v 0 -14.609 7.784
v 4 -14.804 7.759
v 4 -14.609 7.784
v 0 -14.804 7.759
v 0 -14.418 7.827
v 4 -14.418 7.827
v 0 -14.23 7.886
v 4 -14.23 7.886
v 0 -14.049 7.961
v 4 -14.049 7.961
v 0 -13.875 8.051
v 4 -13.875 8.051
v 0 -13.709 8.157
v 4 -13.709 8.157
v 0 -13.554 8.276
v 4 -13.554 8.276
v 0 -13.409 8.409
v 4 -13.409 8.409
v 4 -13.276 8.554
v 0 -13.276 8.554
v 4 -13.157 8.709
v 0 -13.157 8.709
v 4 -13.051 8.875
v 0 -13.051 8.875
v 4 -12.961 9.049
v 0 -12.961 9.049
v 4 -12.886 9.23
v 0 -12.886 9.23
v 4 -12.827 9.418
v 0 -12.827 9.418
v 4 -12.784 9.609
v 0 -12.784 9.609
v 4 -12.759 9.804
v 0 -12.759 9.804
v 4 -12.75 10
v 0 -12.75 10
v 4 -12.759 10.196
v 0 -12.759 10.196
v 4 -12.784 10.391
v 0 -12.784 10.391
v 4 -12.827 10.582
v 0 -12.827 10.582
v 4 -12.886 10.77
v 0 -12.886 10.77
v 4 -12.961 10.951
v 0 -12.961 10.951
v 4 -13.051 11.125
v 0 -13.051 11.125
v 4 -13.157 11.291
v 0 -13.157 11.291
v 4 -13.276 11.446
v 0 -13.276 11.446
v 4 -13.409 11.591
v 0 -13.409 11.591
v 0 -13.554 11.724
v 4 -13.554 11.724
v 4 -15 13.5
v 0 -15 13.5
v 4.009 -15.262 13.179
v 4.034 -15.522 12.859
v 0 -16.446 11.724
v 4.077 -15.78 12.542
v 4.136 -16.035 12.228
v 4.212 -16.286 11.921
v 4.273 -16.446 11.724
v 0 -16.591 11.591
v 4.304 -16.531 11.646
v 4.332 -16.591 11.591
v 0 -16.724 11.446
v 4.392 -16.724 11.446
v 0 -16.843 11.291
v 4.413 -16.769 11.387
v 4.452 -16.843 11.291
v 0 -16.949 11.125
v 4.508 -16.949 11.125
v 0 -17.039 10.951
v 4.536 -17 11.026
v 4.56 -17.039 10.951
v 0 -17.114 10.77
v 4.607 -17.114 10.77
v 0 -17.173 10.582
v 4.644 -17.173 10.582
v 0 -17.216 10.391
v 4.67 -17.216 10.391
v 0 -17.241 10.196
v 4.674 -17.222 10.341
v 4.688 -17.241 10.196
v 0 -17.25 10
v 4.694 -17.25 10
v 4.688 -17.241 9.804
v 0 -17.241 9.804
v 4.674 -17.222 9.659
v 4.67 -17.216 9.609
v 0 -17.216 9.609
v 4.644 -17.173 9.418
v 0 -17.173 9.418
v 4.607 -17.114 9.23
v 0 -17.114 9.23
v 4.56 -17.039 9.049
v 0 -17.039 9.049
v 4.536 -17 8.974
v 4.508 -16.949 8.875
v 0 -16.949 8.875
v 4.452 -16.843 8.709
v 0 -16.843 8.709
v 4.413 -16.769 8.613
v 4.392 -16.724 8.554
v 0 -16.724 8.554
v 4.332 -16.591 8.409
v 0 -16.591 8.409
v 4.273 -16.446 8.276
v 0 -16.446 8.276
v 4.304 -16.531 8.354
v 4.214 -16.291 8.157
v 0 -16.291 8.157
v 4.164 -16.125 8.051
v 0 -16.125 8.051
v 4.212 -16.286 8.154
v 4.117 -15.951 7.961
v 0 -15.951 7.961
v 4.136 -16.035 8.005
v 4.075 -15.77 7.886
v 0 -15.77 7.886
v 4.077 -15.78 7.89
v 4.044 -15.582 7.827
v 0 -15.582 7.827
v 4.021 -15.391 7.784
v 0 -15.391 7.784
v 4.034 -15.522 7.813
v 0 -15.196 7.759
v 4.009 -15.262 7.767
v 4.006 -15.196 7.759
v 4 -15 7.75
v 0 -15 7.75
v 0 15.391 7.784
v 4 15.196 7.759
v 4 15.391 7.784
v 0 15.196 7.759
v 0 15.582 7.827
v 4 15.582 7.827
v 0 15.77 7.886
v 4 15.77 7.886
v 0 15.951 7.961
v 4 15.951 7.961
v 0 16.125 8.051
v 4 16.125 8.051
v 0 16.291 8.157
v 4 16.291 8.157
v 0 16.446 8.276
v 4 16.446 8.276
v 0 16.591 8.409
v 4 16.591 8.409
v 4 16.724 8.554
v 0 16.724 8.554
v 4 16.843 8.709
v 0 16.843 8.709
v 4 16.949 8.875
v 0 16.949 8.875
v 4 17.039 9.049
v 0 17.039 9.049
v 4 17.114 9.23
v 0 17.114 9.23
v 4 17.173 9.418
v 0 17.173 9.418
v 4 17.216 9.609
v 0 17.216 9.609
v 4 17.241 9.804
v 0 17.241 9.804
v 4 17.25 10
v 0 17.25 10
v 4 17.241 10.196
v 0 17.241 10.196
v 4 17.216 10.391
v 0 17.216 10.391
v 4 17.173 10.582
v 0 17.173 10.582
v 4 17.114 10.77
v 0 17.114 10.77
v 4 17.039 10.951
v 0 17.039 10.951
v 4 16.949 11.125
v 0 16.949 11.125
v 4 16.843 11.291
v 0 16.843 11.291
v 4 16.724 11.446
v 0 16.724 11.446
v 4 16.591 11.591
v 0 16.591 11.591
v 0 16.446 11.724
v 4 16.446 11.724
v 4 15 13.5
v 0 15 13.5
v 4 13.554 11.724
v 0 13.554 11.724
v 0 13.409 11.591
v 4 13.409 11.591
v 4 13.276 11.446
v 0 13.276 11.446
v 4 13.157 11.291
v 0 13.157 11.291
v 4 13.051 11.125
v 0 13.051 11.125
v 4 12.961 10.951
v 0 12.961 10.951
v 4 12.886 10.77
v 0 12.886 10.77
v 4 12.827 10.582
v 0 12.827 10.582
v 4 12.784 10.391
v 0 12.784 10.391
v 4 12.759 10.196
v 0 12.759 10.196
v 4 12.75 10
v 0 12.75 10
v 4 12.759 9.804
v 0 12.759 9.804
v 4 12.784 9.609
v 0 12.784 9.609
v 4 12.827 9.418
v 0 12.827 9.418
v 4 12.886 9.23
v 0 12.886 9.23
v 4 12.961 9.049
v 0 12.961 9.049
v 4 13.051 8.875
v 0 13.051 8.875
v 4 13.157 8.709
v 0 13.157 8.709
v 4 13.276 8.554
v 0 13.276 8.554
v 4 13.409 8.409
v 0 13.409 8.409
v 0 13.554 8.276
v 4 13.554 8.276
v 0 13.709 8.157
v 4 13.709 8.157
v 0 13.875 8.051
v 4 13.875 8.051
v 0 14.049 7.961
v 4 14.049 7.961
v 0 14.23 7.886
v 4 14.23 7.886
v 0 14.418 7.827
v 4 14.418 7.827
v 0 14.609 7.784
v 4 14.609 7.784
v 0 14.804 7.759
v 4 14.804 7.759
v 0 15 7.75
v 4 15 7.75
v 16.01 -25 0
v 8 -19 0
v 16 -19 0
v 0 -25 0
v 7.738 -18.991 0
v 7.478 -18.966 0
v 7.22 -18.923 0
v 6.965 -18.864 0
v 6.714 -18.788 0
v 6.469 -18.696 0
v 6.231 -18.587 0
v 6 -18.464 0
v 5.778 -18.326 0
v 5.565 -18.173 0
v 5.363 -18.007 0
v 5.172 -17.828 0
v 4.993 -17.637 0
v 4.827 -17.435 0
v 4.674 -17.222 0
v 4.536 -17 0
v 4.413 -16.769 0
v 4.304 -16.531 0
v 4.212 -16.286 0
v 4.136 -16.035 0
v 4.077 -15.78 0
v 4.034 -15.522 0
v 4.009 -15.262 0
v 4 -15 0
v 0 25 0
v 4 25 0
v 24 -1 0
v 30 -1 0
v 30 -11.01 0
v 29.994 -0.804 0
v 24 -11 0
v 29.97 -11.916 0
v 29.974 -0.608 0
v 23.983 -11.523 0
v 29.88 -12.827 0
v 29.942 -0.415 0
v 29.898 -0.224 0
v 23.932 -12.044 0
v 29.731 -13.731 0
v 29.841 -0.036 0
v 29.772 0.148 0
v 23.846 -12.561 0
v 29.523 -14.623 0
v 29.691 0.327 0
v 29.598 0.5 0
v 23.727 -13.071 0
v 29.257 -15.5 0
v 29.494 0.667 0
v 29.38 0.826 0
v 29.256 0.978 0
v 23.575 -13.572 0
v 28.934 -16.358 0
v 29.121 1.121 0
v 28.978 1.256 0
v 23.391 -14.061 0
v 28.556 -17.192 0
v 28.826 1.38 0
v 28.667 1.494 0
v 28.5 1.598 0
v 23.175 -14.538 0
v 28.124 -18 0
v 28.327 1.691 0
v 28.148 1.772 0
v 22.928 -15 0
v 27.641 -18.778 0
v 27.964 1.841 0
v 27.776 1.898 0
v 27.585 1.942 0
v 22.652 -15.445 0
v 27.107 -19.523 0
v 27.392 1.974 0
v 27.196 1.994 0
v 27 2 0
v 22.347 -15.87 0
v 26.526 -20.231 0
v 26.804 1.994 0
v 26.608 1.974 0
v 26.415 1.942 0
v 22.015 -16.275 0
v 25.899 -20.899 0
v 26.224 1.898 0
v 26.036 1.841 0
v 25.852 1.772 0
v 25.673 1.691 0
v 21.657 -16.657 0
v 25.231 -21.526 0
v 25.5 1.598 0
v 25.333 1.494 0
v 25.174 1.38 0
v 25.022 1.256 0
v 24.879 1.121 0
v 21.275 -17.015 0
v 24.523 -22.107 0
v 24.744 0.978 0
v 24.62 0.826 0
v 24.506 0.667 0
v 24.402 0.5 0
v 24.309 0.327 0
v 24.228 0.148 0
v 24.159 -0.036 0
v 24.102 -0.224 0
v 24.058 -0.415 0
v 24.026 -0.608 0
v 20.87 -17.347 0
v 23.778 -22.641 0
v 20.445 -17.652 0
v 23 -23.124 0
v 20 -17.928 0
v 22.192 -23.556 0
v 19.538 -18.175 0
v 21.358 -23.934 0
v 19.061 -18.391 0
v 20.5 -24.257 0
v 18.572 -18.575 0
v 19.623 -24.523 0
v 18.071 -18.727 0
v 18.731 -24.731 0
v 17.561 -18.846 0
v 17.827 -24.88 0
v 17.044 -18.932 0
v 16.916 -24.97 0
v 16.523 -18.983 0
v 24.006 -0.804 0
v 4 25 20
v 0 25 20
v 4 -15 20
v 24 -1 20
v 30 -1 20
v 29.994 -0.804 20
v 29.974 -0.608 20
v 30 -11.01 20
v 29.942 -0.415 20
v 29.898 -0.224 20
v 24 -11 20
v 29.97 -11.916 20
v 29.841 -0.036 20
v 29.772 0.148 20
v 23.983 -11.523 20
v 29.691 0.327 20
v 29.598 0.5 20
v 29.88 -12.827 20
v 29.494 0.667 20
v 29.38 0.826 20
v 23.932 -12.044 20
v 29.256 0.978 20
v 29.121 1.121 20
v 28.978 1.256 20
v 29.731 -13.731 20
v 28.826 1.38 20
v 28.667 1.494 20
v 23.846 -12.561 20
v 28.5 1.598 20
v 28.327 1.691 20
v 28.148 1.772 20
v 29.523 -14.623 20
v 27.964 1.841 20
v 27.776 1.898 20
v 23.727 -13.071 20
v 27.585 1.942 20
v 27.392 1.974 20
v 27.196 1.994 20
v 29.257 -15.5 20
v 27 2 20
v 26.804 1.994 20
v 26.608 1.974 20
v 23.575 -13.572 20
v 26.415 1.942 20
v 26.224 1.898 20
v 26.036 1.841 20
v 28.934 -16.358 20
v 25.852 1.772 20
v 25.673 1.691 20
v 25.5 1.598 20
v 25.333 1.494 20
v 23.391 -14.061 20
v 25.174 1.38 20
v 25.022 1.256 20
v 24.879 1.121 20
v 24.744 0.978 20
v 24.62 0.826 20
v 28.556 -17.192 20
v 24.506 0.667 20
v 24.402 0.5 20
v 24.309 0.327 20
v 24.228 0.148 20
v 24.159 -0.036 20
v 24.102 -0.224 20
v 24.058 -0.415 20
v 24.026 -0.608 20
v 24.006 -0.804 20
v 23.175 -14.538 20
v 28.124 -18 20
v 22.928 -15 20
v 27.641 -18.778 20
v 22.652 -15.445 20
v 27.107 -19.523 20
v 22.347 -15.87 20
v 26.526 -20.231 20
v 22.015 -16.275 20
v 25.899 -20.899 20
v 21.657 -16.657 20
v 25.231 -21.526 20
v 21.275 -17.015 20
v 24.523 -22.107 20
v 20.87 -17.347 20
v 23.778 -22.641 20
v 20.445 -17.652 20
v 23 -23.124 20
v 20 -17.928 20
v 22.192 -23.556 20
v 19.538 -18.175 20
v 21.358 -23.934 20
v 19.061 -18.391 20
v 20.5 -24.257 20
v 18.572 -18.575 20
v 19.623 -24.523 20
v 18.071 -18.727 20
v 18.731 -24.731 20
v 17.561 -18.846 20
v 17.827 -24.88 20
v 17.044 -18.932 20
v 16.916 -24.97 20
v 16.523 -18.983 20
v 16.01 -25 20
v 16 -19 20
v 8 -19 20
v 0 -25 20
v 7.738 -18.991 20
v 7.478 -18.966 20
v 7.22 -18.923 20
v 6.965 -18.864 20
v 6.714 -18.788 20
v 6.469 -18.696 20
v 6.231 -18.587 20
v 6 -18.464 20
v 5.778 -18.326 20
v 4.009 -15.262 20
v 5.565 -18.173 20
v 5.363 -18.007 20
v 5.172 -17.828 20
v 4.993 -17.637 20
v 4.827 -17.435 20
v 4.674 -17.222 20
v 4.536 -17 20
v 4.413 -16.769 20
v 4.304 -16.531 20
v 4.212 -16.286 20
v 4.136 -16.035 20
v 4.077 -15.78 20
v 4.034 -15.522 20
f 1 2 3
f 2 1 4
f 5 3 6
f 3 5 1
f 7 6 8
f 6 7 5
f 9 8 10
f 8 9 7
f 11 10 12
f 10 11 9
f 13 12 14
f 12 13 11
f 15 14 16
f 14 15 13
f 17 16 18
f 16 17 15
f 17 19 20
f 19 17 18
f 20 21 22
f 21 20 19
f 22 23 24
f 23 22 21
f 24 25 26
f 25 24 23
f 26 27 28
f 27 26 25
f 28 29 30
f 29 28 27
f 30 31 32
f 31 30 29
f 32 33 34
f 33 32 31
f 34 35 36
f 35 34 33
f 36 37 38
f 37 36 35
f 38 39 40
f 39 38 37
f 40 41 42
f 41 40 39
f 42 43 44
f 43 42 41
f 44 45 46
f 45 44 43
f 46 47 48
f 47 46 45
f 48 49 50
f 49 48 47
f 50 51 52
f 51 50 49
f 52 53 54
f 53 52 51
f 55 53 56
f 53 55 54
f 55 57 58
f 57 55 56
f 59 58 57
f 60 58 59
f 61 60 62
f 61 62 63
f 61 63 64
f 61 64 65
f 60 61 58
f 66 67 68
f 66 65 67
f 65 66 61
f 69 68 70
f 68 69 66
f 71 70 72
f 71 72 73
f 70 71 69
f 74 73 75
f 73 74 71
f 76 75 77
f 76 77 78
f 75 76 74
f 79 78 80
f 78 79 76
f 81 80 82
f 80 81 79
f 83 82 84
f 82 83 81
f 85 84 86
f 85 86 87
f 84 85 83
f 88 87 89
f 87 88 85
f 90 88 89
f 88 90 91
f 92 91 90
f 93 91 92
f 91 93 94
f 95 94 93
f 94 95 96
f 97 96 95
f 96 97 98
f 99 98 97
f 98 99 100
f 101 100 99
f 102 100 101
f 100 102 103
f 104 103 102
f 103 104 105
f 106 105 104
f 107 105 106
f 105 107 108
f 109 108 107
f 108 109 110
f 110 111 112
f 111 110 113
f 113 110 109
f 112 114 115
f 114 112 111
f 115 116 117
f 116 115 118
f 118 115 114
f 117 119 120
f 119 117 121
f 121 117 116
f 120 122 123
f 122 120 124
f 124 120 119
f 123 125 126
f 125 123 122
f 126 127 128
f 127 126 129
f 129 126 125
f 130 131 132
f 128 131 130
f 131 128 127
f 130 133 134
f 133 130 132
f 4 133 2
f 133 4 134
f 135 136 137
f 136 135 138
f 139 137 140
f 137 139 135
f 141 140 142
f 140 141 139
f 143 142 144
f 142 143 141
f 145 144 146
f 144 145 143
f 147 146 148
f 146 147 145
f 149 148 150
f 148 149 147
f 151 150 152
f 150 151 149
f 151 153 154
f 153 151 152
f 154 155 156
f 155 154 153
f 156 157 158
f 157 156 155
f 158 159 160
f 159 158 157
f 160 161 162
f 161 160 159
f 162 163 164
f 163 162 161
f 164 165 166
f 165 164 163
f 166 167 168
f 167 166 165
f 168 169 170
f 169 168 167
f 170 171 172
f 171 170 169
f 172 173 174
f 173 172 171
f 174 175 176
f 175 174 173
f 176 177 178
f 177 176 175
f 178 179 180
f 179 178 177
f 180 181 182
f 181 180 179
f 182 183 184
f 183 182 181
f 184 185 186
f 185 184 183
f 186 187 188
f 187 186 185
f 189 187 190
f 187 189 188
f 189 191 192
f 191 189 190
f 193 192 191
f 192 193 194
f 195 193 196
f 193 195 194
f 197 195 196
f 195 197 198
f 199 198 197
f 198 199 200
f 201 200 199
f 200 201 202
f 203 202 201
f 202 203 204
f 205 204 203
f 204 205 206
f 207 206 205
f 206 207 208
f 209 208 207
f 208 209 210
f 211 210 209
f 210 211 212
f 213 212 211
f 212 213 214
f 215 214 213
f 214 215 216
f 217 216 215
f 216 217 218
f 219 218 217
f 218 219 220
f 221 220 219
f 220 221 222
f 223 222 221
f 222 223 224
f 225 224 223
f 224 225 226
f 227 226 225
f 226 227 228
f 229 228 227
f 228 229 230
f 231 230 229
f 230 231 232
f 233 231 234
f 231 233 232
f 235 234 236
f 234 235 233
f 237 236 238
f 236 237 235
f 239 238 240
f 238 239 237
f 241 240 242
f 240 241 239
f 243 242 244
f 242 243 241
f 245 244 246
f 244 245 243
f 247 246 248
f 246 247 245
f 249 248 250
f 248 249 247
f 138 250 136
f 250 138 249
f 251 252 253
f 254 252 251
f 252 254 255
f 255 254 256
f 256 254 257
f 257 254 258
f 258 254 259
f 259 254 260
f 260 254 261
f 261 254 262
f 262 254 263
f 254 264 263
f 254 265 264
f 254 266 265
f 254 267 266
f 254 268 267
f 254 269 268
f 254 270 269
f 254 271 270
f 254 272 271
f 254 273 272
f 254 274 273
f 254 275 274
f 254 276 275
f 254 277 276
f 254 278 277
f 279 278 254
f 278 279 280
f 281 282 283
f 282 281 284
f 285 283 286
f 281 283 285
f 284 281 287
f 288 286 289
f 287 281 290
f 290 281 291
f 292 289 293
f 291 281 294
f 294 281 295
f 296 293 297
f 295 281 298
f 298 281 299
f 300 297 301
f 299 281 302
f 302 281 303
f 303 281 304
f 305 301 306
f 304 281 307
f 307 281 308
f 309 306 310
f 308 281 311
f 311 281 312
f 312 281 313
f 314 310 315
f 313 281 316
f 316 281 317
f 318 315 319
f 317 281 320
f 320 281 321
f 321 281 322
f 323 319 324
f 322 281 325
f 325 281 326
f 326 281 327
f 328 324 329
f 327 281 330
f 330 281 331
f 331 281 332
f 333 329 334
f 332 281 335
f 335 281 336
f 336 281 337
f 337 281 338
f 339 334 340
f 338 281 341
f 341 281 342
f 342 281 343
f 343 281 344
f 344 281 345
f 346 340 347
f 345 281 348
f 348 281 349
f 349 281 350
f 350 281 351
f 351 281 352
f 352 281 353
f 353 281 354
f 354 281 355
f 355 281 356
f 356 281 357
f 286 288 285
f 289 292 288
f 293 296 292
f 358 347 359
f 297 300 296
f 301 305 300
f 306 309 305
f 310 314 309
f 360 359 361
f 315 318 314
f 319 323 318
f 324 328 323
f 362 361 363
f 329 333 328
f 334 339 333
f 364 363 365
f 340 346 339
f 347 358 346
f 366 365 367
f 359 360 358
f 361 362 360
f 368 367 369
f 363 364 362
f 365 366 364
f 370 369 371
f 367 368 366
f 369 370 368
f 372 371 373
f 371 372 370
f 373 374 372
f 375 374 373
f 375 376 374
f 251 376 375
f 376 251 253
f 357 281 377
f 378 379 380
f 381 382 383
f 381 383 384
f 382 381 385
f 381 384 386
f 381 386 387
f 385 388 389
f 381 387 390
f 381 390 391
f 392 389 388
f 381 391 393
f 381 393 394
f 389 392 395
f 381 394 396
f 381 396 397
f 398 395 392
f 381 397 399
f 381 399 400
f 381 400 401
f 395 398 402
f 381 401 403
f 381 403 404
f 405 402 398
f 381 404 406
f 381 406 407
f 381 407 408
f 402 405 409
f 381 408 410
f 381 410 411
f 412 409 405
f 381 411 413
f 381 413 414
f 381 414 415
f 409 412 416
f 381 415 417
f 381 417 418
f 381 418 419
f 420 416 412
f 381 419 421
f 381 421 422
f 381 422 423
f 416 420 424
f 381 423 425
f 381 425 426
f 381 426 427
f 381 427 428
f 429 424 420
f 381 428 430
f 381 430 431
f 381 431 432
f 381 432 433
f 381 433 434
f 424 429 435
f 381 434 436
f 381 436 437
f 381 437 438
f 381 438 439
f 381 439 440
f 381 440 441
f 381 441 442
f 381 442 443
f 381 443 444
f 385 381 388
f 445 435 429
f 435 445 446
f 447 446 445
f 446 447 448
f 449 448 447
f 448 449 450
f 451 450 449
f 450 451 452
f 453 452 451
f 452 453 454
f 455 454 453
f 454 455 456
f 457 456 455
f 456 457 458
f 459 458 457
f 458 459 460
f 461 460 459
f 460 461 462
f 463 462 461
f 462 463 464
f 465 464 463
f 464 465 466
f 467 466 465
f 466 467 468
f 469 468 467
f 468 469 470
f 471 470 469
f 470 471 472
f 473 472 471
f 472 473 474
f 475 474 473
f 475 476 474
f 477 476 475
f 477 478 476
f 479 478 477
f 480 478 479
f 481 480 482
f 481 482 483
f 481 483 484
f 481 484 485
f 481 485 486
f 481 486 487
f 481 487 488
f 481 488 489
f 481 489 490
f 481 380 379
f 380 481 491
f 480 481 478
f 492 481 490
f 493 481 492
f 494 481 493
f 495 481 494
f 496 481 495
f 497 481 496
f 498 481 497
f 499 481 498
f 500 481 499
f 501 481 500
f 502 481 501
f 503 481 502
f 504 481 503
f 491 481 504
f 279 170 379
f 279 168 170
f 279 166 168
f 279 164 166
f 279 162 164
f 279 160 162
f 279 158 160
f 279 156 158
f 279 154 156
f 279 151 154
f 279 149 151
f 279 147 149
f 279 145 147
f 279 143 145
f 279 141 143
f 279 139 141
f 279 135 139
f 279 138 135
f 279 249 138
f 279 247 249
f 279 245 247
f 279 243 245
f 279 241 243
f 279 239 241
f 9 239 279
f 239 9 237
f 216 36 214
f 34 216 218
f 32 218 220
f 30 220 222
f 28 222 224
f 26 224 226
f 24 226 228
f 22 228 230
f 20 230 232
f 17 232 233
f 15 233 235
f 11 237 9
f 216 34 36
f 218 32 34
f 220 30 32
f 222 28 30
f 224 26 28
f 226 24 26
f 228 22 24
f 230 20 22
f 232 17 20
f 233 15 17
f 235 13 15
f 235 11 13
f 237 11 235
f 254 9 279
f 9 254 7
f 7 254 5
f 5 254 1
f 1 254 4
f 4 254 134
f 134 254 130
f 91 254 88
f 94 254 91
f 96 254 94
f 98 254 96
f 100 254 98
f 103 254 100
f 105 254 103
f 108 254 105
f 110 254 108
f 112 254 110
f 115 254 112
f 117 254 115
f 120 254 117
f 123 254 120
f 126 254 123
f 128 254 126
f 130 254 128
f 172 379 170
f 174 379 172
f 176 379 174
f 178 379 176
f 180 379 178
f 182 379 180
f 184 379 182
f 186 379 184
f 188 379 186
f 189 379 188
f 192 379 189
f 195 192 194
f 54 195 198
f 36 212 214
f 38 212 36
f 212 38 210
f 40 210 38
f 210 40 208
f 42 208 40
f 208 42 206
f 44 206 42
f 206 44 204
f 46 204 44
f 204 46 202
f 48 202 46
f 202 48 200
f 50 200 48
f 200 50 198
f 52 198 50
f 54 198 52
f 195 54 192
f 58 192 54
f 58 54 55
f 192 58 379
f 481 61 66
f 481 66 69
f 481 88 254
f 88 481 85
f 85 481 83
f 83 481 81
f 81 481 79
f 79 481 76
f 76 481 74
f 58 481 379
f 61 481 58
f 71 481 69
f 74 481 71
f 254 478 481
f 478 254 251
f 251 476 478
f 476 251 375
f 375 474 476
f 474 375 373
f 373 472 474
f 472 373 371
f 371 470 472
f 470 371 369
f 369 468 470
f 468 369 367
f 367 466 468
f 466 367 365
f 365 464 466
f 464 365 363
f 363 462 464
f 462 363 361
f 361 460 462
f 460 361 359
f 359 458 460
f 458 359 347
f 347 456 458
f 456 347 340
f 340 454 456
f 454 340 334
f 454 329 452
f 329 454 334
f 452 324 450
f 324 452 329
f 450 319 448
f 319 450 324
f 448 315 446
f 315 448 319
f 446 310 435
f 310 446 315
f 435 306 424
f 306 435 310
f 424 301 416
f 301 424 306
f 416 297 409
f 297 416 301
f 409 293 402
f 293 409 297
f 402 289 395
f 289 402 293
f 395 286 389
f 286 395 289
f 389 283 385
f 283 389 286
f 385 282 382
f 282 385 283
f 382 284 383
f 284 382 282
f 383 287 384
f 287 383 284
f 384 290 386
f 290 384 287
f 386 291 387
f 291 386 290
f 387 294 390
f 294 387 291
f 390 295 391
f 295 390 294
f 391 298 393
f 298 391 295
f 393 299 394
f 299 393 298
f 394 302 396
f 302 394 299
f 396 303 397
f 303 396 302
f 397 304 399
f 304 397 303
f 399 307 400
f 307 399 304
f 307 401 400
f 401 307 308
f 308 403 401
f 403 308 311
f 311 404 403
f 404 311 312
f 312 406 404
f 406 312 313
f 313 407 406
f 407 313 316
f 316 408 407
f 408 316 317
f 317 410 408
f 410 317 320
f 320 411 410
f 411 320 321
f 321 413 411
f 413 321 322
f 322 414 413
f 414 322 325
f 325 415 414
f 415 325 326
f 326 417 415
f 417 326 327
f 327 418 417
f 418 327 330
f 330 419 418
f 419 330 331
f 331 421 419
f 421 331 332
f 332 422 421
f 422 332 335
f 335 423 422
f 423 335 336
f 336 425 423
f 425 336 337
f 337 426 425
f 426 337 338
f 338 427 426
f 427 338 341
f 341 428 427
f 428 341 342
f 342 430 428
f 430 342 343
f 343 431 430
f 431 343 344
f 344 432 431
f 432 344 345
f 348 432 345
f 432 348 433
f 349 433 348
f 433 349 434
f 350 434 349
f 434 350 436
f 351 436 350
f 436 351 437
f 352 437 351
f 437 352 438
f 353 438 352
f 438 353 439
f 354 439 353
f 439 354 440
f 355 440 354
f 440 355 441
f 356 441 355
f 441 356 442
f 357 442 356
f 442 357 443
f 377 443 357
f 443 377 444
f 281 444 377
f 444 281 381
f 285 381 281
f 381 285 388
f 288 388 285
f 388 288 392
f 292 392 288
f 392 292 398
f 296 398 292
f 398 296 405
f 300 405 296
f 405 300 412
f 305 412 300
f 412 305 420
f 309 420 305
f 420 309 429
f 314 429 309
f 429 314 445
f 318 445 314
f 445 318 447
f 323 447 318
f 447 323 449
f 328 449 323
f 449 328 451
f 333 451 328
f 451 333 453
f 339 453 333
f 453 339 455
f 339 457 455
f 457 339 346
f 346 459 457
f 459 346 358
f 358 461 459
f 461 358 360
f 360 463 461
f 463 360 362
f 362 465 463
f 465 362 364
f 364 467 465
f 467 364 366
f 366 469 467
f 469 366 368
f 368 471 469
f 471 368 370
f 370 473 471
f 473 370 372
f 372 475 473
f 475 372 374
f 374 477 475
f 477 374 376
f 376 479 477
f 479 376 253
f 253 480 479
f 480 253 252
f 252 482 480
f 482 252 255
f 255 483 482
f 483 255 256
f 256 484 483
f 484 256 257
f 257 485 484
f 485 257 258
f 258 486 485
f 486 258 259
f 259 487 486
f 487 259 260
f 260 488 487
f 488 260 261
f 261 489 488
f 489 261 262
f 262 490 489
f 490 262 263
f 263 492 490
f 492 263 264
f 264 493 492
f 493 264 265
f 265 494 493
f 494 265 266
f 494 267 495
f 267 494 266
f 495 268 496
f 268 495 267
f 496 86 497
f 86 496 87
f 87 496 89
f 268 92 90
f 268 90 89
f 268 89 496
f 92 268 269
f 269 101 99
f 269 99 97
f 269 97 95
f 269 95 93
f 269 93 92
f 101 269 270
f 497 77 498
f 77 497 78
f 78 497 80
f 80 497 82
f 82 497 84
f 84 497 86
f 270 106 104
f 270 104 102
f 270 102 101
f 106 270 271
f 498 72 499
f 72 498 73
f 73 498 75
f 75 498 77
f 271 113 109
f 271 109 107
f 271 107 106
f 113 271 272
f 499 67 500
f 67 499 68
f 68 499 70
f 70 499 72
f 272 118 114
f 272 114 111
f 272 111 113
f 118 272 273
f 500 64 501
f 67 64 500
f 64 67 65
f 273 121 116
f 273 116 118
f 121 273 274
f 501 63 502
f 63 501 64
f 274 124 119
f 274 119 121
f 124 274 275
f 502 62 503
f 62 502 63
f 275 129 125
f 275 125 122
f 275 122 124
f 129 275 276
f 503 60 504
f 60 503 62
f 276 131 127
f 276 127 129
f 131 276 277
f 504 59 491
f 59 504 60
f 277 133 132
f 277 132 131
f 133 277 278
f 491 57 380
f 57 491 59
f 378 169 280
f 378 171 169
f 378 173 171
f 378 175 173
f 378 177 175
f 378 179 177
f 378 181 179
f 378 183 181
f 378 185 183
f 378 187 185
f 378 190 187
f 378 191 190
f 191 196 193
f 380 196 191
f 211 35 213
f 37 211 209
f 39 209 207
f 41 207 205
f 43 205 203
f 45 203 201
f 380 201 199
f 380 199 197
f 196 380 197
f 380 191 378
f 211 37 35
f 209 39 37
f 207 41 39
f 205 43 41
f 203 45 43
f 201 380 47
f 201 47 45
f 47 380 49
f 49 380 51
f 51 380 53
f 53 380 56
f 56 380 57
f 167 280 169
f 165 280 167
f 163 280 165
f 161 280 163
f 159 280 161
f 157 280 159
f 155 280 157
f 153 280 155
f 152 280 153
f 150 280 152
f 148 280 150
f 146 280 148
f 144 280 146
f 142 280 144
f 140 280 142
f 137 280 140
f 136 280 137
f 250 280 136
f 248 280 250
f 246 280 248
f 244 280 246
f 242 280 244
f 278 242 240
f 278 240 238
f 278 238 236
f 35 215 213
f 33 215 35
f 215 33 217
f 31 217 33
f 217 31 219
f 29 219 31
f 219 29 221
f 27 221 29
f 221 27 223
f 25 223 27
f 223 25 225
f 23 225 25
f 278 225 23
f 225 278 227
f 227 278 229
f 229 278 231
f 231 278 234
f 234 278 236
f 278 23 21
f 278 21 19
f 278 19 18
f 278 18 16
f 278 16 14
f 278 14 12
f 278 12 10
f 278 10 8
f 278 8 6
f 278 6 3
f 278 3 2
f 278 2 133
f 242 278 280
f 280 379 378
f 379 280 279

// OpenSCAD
// TEMPLATE: wall / rail J-hook — a mounting plate with two screw holes and a J-shaped hook with a rated load; filleted root, rounded tip
// Interfaces: mount_holes (two horizontal holes through the plate, screw_d + clearance). The plate's back face is the wall: x = 0.
// Origin at the wall face, midway between the screws (y = 0); the hook curls out along +X; the part is extruded along Z (its width).
// Print orientation: ON ITS SIDE — the J profile lies flat on the bed (z = 0 is one side face) so the layers run along the shank and
// curl; the bending load then runs along the layers, not across them. In use, +Y points up: the shank is at the plate's lower end.
// Load path: hung load -> curl -> shank (cantilever, sized by the bending rule below) -> root fillet -> plate -> upper screw in tension.

/* [Interface] */
screw_d = 4.0;           // [2:0.1:8]  screw shank diameter (M4 = 4.0)
clearance = 0.5;         // [0:0.05:1]  added to the hole diameter
hole_spacing = 30;       // [12:1:100]  centre distance between the two screws (along the plate)

/* [Plate] */
plate_t = 4;             // [2.4:0.2:10]
plate_len = 50;          // [20:1:150]
width = 20;              // [8:1:60]  hook width (extrusion along Z)

/* [Hook] */
reach = 30;              // [12:1:80]  from the wall face to the outside of the tip
throat_r = 8;            // [3:0.5:30]  inside radius of the curl (half the rod / strap thickness it accepts)
arm_t = 6;               // [3:0.5:15]  shank and curl thickness
tip_len = 10;            // [0:1:40]  straight tip rising from the curl
root_fillet = 4;         // [0:0.5:12]  fillet where the shank meets the plate

/* [Rating] */
rated_load_kg = 5;       // [0.5:0.5:30]
safety_factor = 3;       // [1.5:0.5:6]
strength_mpa = 30;       // [10:1:80]  tensile strength of the printed material along the layers (PETG ~ 30, PLA ~ 45)

/* [Render] */
render_target = "part";  // [part, coupon, assembly]

/* [Hidden] */
$fn = 96;
hole = screw_d + clearance;
teardrop_angle = 50;                                   // roof angle of the horizontal holes
y0 = -plate_len / 2;                                   // plate lower end (the shank's underside is flush with it)
x_c = reach - throat_r - arm_t;                        // curl centre x
y_c = y0 + arm_t + throat_r;                           // curl centre y
shank_len = x_c - plate_t;
load_n = rated_load_kg * 9.81;
moment_nmm = load_n * (x_c - plate_t);                 // load hangs at the curl centre line
stress_mpa = 6 * moment_nmm / (width * arm_t * arm_t);
allowable_mpa = strength_mpa / safety_factor;
arm_t_needed = sqrt(6 * moment_nmm / (width * allowable_mpa));
upper_screw_pull_n = load_n * x_c / hole_spacing;

assert(shank_len >= root_fillet + 2, "reach too short for the curl, the shank and the root fillet");
assert(stress_mpa <= allowable_mpa, str("shank overstressed: needs arm_t >= ", arm_t_needed, " mm for ", rated_load_kg, " kg"));
assert(hole_spacing / 2 + hole / 2 + 1.6 <= plate_len / 2 - 0, "screw holes too close to the plate ends");
assert(width - hole >= 3.2, "plate too narrow for the holes");
echo(hole = hole, shank_len = shank_len, curl_centre = [x_c, y_c], stress_mpa = stress_mpa, allowable_mpa = allowable_mpa,
     arm_t_needed = arm_t_needed, upper_screw_pull_n = upper_screw_pull_n);

module teardrop2d(d, ang, n = 56) {
    r = d / 2;
    sweep = 360 - 2 * (90 - ang);
    polygon(concat([for (i = [0 : n]) let(a = ang - i * sweep / n) [r * cos(a), r * sin(a)]], [[0, r / sin(90 - ang)]]));
}

// J profile in the XY plane
module profile2d() {
    union() {
        translate([0, y0]) square([plate_t, plate_len]);                                      // plate
        translate([plate_t - 0.01, y0]) square([shank_len + 0.02, arm_t]);                   // shank
        translate([x_c, y_c]) intersection() {                                                // quarter curl
            difference() { circle(r = throat_r + arm_t); circle(r = throat_r); }
            translate([0, -throat_r - arm_t - 1]) square([throat_r + arm_t + 1, throat_r + arm_t + 1]);
        }
        translate([x_c + throat_r, y_c - 0.01]) square([arm_t, tip_len + 0.01]);              // tip
        translate([x_c + throat_r + arm_t / 2, y_c + tip_len]) circle(d = arm_t);            // rounded tip end
        if (root_fillet > 0) translate([plate_t, y0 + arm_t]) difference() {                 // root fillet
            square([root_fillet, root_fillet]);
            translate([root_fillet, root_fillet]) circle(r = root_fillet);
        }
    }
}

module holes() {
    for (s = [-1, 1]) translate([-1, s * hole_spacing / 2, width / 2]) rotate([90, 0, 90])
        linear_extrude(height = plate_t + 2) teardrop2d(hole, teardrop_angle);
}

module part() { difference() { linear_extrude(height = width) profile2d(); holes(); } }

module coupon() {
    // hole ladder: a strip of the plate with three teardrop holes at clearance -0.2 / 0 / +0.2, printed like the part (on its side)
    difference() {
        union() {
            translate([0, -24, 0]) cube([plate_t, 48, 14]);
            for (i = [-1, 0, 1]) translate([plate_t, i * 16, 11]) rotate([90, 0, 90]) linear_extrude(0.6) text(str(i * 0.2), size = 2.4, halign = "center", $fn = 16);
        }
        for (i = [-1, 0, 1]) translate([-1, i * 16, 5.5]) rotate([90, 0, 90]) linear_extrude(height = plate_t + 2) teardrop2d(hole + i * 0.2, teardrop_angle);
    }
}

module assembly() {
    part();
    %translate([-6, y0 - 10, -10]) cube([6, plate_len + 20, width + 20]);                          // wall
    for (s = [-1, 1]) %translate([-12, s * hole_spacing / 2, width / 2]) rotate([0, 90, 0]) cylinder(d = screw_d, h = 12 + plate_t + 4);
    %translate([x_c, y_c - 1.7, -5]) cylinder(d = 2 * throat_r - 4, h = width + 10);               // the hung rod
}

if (render_target == "part") part();
else if (render_target == "coupon") coupon();
else assembly();
